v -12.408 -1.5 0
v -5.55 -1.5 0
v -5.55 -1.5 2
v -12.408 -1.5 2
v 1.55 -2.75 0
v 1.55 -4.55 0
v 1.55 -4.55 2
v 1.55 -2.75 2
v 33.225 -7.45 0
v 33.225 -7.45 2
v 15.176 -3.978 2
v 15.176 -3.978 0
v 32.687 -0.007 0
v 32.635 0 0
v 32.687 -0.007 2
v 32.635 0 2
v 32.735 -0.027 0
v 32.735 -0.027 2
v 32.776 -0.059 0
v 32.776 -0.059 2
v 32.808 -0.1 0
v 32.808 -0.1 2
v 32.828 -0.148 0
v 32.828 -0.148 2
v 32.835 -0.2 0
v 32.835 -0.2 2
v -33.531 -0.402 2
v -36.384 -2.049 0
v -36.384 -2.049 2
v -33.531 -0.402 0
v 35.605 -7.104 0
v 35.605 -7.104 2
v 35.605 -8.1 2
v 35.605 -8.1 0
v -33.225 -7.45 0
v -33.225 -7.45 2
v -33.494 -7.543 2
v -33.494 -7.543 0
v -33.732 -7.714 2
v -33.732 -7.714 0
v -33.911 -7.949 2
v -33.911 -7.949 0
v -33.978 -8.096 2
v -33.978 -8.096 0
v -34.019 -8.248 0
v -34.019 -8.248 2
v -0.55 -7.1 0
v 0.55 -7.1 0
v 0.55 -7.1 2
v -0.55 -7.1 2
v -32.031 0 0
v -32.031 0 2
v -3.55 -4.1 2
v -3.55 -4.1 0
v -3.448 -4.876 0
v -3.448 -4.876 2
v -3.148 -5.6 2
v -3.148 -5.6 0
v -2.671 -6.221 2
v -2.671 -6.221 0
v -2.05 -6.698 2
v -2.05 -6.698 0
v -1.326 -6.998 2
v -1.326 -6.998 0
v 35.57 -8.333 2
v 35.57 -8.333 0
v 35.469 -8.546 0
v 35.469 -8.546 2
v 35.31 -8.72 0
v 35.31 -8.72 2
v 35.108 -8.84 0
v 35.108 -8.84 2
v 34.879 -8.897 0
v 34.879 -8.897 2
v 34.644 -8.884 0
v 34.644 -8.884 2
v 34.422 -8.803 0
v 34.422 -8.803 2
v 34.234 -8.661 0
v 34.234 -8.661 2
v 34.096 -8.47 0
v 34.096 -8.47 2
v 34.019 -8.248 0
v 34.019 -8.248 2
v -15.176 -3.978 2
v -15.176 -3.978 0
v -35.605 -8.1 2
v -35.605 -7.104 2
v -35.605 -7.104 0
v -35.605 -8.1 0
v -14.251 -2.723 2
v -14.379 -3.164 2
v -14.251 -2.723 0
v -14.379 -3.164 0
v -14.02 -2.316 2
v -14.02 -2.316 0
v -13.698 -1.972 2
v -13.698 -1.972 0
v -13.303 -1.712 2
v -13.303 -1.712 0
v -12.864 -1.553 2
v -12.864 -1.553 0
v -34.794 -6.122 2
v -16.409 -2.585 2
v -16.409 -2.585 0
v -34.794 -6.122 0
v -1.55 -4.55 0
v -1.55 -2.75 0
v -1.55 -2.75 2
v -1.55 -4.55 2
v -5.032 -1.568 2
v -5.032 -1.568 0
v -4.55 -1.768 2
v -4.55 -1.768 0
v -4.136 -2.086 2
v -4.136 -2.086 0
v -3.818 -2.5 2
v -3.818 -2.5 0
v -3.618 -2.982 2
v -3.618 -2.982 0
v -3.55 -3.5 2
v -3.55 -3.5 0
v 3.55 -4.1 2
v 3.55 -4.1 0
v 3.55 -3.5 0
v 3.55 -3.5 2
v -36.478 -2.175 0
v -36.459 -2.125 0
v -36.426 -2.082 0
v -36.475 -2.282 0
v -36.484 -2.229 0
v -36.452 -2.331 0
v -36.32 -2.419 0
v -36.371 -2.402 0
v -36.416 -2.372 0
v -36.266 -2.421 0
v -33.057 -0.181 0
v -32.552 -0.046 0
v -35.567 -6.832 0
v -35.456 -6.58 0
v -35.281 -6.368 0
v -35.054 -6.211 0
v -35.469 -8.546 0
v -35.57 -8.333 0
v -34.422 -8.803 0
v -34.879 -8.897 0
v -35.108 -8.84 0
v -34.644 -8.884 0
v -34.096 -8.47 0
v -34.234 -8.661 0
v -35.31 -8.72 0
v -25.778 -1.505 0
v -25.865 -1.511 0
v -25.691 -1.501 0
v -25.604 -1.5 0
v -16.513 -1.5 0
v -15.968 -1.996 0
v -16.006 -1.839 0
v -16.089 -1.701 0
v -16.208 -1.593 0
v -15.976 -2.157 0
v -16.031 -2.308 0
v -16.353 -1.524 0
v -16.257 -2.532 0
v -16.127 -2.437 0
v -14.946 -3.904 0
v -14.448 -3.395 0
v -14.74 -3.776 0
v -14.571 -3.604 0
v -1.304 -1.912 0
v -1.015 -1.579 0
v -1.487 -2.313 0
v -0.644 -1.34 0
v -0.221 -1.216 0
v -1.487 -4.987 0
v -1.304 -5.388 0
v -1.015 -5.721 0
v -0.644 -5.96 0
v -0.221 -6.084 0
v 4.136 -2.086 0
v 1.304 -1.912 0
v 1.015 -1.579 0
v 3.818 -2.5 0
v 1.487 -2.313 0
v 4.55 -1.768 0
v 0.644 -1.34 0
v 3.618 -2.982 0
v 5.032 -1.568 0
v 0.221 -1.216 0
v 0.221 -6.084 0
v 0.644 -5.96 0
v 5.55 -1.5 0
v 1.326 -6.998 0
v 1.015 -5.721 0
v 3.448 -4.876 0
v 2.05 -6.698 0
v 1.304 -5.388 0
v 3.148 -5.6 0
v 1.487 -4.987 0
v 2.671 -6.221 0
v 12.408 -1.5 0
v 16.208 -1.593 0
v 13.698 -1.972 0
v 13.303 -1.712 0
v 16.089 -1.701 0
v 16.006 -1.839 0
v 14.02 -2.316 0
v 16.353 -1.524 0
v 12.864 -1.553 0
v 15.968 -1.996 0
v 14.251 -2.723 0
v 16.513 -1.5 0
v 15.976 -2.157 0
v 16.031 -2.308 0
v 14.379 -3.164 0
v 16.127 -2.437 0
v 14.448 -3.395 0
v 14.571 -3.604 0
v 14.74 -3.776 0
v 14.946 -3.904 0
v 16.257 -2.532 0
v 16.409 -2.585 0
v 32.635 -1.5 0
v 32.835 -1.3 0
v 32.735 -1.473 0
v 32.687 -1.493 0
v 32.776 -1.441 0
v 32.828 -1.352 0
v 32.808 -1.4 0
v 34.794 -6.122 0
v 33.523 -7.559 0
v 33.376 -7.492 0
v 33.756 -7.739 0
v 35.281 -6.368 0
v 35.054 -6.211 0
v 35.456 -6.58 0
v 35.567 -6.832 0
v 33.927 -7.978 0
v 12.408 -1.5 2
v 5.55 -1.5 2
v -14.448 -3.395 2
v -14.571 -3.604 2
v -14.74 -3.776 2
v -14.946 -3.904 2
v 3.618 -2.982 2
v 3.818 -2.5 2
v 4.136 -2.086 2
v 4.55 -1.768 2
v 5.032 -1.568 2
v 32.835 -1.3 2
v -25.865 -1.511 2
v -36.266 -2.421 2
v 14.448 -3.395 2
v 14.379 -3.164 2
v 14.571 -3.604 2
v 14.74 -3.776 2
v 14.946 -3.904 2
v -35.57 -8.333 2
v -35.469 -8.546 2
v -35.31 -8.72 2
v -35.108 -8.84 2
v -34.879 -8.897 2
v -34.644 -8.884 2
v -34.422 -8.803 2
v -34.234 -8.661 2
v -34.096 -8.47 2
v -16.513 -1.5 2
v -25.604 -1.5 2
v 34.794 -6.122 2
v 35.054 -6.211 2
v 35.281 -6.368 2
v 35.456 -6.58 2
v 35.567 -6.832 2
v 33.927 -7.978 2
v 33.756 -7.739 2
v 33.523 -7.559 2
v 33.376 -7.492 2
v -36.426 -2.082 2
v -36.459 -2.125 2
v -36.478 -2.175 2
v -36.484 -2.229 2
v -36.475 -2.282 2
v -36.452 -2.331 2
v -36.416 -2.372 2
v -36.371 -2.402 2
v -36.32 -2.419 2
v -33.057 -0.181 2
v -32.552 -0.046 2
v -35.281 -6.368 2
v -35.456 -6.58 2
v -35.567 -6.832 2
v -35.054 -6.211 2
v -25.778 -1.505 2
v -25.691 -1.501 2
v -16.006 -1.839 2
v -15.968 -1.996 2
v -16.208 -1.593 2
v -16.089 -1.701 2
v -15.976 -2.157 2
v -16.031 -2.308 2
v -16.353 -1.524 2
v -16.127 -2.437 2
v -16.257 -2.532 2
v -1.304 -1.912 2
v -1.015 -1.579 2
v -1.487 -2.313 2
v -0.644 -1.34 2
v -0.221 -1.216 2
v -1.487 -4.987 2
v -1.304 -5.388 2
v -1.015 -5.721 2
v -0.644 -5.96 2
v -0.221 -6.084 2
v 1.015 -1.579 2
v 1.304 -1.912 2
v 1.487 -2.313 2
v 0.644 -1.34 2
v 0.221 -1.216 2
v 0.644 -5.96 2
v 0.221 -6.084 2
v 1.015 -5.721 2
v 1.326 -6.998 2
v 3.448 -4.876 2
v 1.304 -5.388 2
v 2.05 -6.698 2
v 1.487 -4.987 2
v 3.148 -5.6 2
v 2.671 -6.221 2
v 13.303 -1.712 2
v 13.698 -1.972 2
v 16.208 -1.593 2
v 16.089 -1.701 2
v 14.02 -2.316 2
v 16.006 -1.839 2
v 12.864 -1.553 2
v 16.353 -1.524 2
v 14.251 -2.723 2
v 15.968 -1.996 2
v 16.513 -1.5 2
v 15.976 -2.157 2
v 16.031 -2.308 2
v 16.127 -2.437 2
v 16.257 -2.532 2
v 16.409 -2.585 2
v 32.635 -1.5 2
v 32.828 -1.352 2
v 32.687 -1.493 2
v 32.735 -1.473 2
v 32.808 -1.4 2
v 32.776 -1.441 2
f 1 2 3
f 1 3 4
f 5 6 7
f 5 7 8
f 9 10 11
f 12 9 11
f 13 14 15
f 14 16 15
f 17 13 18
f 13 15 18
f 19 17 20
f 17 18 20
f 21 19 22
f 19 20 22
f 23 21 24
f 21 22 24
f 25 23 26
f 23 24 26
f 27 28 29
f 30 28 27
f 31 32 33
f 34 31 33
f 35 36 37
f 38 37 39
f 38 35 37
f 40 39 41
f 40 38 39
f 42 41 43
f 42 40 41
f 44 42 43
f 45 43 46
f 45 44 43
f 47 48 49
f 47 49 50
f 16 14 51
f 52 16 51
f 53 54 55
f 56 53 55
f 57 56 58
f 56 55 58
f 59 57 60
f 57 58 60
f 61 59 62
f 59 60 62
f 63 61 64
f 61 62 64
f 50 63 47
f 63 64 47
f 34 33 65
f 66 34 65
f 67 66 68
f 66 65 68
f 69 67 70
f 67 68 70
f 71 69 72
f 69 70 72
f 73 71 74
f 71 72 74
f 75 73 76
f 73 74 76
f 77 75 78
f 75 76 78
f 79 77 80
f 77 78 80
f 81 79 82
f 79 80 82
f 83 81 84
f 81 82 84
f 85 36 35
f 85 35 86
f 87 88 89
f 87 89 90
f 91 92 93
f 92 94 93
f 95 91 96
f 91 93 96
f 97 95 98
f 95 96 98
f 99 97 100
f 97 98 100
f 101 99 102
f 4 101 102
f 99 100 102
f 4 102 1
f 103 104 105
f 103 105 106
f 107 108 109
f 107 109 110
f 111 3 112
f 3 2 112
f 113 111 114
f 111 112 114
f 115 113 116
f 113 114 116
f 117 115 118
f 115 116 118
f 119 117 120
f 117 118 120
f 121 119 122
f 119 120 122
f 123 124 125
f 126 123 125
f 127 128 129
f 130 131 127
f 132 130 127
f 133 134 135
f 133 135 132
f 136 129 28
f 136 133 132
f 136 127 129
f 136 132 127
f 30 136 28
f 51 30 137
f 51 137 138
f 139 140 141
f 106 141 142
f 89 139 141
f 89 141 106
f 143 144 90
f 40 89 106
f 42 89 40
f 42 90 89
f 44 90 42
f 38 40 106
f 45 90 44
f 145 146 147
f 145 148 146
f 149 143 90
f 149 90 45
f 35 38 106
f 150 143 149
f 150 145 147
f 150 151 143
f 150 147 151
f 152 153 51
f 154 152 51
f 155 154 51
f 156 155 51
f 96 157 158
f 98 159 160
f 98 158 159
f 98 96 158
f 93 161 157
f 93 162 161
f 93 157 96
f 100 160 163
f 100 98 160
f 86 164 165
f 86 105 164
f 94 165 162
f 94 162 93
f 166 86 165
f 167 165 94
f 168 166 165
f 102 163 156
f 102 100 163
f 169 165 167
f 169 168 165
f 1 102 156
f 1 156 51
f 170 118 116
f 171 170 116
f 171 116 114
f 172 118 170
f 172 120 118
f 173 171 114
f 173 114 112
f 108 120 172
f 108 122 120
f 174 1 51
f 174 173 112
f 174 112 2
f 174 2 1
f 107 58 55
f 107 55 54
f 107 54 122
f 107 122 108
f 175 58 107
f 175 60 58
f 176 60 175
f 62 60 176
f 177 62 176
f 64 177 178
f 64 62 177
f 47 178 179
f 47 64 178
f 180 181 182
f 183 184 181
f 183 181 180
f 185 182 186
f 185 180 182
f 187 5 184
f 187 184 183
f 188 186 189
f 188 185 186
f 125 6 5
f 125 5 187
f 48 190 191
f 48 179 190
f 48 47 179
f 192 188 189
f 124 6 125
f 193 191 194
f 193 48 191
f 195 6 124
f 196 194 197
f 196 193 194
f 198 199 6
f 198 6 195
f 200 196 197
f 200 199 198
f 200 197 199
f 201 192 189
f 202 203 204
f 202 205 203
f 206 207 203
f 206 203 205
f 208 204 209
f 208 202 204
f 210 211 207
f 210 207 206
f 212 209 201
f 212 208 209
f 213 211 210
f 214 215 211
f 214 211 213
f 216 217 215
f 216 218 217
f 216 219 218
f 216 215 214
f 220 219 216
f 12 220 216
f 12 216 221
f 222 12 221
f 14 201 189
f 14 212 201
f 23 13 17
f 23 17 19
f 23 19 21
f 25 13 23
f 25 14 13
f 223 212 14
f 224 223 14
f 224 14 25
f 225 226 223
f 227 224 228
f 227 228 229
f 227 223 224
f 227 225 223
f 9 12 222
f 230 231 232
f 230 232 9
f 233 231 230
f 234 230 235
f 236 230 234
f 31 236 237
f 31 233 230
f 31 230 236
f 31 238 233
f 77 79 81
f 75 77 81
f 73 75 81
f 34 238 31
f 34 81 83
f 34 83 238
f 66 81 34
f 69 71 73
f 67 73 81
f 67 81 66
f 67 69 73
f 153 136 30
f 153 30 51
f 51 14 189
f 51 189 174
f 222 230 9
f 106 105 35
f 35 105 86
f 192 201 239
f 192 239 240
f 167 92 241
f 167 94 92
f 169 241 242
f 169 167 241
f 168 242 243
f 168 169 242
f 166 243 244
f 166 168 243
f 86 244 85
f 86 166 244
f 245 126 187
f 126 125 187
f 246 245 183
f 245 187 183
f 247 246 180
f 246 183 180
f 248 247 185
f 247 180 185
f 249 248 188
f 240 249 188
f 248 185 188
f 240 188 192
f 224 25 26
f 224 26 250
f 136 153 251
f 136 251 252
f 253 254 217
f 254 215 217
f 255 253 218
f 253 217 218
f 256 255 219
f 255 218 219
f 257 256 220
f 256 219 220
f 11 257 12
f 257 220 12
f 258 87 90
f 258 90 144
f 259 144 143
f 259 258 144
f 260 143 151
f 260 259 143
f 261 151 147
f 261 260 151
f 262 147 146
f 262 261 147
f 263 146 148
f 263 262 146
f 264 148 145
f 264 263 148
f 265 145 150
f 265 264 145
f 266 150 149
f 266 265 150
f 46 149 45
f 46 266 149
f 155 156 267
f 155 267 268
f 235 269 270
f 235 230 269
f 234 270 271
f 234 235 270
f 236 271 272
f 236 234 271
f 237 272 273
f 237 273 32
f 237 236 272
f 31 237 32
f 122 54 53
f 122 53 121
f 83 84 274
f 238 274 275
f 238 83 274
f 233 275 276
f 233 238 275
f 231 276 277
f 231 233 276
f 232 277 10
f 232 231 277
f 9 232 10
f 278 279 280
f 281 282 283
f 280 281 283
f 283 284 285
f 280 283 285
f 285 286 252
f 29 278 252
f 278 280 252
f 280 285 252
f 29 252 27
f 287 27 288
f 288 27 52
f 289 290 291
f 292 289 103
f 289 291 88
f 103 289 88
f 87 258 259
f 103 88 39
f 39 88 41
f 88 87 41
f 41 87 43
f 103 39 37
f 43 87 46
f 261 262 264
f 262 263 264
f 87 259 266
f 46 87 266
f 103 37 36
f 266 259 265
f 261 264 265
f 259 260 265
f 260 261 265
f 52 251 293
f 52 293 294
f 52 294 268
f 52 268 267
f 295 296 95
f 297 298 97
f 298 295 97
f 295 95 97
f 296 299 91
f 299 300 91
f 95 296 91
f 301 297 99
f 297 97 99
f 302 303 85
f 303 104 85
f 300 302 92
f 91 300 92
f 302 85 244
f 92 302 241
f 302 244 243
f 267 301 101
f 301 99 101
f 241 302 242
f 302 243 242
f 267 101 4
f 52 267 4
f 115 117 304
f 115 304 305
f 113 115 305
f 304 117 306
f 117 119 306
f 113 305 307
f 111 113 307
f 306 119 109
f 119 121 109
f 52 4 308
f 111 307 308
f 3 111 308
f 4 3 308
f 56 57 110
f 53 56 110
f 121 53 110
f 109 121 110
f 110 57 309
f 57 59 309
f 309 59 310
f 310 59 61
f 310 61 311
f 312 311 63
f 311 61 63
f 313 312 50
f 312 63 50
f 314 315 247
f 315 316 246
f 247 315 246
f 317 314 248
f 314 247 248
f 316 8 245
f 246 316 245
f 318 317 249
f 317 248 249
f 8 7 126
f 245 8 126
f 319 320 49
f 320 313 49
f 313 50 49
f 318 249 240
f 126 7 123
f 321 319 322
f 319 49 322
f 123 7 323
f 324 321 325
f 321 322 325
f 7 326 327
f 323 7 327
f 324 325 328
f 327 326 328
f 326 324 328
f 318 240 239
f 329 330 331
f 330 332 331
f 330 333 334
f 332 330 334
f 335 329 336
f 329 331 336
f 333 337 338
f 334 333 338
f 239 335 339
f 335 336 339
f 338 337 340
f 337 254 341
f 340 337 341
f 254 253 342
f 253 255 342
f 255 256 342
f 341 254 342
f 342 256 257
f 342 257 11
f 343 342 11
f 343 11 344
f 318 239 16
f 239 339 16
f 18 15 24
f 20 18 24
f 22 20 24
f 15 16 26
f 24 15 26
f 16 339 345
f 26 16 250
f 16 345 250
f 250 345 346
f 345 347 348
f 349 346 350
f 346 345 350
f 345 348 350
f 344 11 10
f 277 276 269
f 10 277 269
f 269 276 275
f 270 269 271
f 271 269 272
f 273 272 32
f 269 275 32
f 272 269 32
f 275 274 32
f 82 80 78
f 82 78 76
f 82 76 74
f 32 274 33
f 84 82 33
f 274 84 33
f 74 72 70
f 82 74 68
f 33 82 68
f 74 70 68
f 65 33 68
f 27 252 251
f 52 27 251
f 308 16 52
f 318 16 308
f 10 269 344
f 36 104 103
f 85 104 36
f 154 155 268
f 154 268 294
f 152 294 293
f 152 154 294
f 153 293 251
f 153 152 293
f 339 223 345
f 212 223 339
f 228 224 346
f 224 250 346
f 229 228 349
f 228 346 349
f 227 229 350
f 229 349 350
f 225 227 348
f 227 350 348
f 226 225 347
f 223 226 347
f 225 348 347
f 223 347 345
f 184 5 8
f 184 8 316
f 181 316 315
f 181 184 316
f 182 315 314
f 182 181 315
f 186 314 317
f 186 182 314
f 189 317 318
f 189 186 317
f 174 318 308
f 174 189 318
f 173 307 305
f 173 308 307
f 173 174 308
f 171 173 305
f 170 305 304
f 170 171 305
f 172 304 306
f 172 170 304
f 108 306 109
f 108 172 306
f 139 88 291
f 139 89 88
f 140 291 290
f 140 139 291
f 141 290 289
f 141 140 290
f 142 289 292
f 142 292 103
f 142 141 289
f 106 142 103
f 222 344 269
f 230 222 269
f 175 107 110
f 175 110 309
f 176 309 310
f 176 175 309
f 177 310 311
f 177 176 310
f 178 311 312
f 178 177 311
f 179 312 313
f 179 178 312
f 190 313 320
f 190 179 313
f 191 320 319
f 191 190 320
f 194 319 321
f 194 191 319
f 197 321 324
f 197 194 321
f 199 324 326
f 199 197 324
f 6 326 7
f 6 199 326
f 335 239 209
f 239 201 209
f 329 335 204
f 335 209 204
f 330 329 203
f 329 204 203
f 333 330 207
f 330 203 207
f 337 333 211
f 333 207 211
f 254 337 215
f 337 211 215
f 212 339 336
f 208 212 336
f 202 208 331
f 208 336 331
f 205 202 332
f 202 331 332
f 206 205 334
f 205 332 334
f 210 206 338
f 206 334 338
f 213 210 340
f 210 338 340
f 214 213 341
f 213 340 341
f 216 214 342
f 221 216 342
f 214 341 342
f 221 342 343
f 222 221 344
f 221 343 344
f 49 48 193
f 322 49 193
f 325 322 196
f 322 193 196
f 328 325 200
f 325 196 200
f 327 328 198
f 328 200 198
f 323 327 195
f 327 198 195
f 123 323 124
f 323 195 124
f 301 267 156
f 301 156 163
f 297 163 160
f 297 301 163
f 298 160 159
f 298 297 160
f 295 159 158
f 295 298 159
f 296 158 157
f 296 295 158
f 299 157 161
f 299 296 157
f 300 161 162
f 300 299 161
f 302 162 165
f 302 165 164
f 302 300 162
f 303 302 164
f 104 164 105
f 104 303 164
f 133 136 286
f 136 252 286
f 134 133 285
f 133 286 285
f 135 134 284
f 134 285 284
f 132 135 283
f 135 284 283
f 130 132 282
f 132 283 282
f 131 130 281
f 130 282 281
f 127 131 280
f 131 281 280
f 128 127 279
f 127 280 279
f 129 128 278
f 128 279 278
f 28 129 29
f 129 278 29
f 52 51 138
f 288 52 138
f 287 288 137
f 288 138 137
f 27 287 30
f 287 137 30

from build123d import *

# Parameters (mm, degrees)
FLAT_DEPTH              = 2
SKETCH3_W               = 7.1
SKETCH3_H               = 7.1
BOSS_EXTRUDE3_DEPTH     = 2
CUT_EXTRUDE1_DEPTH      = 38.889997963
CUT_EXTRUDE1_DEPTH_BACK = 38.889997963
BOSS_EXTRUDE5_DEPTH     = 2
FILLET3_R               = 1
FILLET4_R               = 2
FILLET8_R               = 2
FILLET6_R               = 0.2
FILLET7_R               = 3


with BuildPart() as part:
    # Sketch2 → flat (new body)
    with BuildSketch(Plane.XY):
        Polygon((-32.834936491, 0), (32.834936491, 0), (32.834936491, -1.5), (-25.735011207, -1.5), (-37.165063509, -2.5), align=None)
    extrude(amount=FLAT_DEPTH)

    # Sketch3 → Boss-Extrude3 (add)
    with BuildSketch(Plane(origin=(0, 0, 0), x_dir=(-1, 0, 0), z_dir=(0, 0, -1))):
        with Locations((0, -3.55)):
            Rectangle(SKETCH3_W, SKETCH3_H)
    extrude(amount=-BOSS_EXTRUDE3_DEPTH)

    # Sketch4 → Cut-Extrude1 (cut, two sides: drawn at the far end of the back side and taken through both)
    with BuildSketch(Plane.XY.offset(2).offset(-CUT_EXTRUDE1_DEPTH_BACK)):
        with BuildLine():
            Line((-1.55, -2.75), (-1.55, -4.55))
            ThreePointArc((-1.55, -4.55), (0, -6.1), (1.55, -4.55))
            Line((1.55, -4.55), (1.55, -2.75))
            ThreePointArc((1.55, -2.75), (0, -1.2), (-1.55, -2.75))
        make_face()
    extrude(amount=CUT_EXTRUDE1_DEPTH + CUT_EXTRUDE1_DEPTH_BACK, mode=Mode.SUBTRACT)

    # Sketch6 → Boss-Extrude5 (add)
    with BuildSketch(Plane.XY.offset(2)):
        with BuildLine():
            Line((-16.409257503, -2.585457858), (-35.604897729, -6.278480095))
            Line((-35.604897729, -6.278480095), (-35.604897729, -8.1))
            ThreePointArc((-35.604897729, -8.1), (-34.804897729, -8.9), (-34.004897729, -8.1))
            Line((-34.004897729, -8.1), (-34.004897729, -7.6))
            Line((-34.004897729, -7.6), (-14.365063509, -3.821519905))
            Line((-14.365063509, -3.821519905), (-14.365063509, -1.5))
            Line((-14.365063509, -1.5), (-16.512723649, -1.5))
            ThreePointArc((-16.512723649, -1.5), (-15.96753469, -1.995692576), (-16.409257503, -2.585457858))
        make_face()
    boss_extrude5 = extrude(amount=-BOSS_EXTRUDE5_DEPTH)

    # Mirror4: Boss-Extrude5 across plane
    add(boss_extrude5.mirror(Plane(origin=(0, 0, 0), x_dir=(0, 0, 1), z_dir=(1, 0, 0))))

    # Fillet3
    fillet3_edges = [part.edges().sort_by_distance(p)[0] for p in [
        (-35.604897729, -6.278480095, 1),
        (-34.004897729, -7.6, 1),
        (-14.365063509, -3.821519905, 1),
        (35.604897729, -6.278480095, 1),
        (34.004897729, -7.6, 1),
        (14.365063509, -3.821519905, 1),
    ]]
    fillet(fillet3_edges, radius=FILLET3_R)

    # Fillet4
    fillet4_edges = [part.edges().sort_by_distance(p)[0] for p in [
        (-14.365063509, -1.5, 1),
        (14.365063509, -1.5, 1),
    ]]
    fillet(fillet4_edges, radius=FILLET4_R)

    # Fillet8
    fillet8_edges = [part.edges().sort_by_distance(p)[0] for p in [
        (-3.55, -1.5, 1),
        (3.55, -1.5, 1),
    ]]
    fillet(fillet8_edges, radius=FILLET8_R)

    # Fillet6
    fillet6_edges = [part.edges().sort_by_distance(p)[0] for p in [
        (32.834936491, 0, 1),
        (32.834936491, -1.5, 1),
        (-37.165063509, -2.5, 1),
    ]]
    fillet(fillet6_edges, radius=FILLET6_R)

    # Fillet7
    # the kernel refuses this fillet: 3 mm, written as the material it adds along each edge
    with BuildSketch(Plane(origin=(-25.735011207, -1.5, 0), x_dir=(-0.996194698091746, -0.0871557427476529, 0), z_dir=(0, 0, 1))) as fillet7_piece_1:
        with BuildLine():
            CenterArc((FILLET7_R * 0.0436609429085, FILLET7_R), FILLET7_R, 265, 5)
            Line((-FILLET7_R * 0.0434947998391, FILLET7_R * 0.00380530190825), (0, 0))
            Line((0, 0), (FILLET7_R * 0.0436609429085, 0))
        make_face()
    extrude(amount=2)
    # the kernel refuses this fillet: 3 mm, written as the material it takes off along each edge
    with BuildSketch(Plane(origin=(3.55, -7.1, -7.5), x_dir=(0, 1, 0), z_dir=(0, 0, 1)), Plane(origin=(-3.55, -7.1, -7.5), x_dir=(1, 0, 0), z_dir=(0, 0, 1))) as fillet7_2_piece_1:
        with BuildLine():
            CenterArc((FILLET7_R, FILLET7_R), FILLET7_R, 180, 90)
            Line((0, FILLET7_R), (0, 0))
            Line((0, 0), (FILLET7_R, 0))
        make_face()
    extrude(amount=17, mode=Mode.SUBTRACT)
    with BuildSketch(Plane(origin=(-32.834936491, 0, -2.009618943), x_dir=(1, 0, 0), z_dir=(0, 0, 1))) as fillet7_2_piece_2:
        with BuildLine():
            CenterArc((FILLET7_R * 0.267949192431, -FILLET7_R), FILLET7_R, 90, 30)
            Line((-FILLET7_R * 0.232050807569, -FILLET7_R * 0.133974596216), (0, 0))
            Line((0, 0), (FILLET7_R * 0.267949192431, 0))
        make_face()
    extrude(amount=6.019237886, mode=Mode.SUBTRACT)


solid = part.part
